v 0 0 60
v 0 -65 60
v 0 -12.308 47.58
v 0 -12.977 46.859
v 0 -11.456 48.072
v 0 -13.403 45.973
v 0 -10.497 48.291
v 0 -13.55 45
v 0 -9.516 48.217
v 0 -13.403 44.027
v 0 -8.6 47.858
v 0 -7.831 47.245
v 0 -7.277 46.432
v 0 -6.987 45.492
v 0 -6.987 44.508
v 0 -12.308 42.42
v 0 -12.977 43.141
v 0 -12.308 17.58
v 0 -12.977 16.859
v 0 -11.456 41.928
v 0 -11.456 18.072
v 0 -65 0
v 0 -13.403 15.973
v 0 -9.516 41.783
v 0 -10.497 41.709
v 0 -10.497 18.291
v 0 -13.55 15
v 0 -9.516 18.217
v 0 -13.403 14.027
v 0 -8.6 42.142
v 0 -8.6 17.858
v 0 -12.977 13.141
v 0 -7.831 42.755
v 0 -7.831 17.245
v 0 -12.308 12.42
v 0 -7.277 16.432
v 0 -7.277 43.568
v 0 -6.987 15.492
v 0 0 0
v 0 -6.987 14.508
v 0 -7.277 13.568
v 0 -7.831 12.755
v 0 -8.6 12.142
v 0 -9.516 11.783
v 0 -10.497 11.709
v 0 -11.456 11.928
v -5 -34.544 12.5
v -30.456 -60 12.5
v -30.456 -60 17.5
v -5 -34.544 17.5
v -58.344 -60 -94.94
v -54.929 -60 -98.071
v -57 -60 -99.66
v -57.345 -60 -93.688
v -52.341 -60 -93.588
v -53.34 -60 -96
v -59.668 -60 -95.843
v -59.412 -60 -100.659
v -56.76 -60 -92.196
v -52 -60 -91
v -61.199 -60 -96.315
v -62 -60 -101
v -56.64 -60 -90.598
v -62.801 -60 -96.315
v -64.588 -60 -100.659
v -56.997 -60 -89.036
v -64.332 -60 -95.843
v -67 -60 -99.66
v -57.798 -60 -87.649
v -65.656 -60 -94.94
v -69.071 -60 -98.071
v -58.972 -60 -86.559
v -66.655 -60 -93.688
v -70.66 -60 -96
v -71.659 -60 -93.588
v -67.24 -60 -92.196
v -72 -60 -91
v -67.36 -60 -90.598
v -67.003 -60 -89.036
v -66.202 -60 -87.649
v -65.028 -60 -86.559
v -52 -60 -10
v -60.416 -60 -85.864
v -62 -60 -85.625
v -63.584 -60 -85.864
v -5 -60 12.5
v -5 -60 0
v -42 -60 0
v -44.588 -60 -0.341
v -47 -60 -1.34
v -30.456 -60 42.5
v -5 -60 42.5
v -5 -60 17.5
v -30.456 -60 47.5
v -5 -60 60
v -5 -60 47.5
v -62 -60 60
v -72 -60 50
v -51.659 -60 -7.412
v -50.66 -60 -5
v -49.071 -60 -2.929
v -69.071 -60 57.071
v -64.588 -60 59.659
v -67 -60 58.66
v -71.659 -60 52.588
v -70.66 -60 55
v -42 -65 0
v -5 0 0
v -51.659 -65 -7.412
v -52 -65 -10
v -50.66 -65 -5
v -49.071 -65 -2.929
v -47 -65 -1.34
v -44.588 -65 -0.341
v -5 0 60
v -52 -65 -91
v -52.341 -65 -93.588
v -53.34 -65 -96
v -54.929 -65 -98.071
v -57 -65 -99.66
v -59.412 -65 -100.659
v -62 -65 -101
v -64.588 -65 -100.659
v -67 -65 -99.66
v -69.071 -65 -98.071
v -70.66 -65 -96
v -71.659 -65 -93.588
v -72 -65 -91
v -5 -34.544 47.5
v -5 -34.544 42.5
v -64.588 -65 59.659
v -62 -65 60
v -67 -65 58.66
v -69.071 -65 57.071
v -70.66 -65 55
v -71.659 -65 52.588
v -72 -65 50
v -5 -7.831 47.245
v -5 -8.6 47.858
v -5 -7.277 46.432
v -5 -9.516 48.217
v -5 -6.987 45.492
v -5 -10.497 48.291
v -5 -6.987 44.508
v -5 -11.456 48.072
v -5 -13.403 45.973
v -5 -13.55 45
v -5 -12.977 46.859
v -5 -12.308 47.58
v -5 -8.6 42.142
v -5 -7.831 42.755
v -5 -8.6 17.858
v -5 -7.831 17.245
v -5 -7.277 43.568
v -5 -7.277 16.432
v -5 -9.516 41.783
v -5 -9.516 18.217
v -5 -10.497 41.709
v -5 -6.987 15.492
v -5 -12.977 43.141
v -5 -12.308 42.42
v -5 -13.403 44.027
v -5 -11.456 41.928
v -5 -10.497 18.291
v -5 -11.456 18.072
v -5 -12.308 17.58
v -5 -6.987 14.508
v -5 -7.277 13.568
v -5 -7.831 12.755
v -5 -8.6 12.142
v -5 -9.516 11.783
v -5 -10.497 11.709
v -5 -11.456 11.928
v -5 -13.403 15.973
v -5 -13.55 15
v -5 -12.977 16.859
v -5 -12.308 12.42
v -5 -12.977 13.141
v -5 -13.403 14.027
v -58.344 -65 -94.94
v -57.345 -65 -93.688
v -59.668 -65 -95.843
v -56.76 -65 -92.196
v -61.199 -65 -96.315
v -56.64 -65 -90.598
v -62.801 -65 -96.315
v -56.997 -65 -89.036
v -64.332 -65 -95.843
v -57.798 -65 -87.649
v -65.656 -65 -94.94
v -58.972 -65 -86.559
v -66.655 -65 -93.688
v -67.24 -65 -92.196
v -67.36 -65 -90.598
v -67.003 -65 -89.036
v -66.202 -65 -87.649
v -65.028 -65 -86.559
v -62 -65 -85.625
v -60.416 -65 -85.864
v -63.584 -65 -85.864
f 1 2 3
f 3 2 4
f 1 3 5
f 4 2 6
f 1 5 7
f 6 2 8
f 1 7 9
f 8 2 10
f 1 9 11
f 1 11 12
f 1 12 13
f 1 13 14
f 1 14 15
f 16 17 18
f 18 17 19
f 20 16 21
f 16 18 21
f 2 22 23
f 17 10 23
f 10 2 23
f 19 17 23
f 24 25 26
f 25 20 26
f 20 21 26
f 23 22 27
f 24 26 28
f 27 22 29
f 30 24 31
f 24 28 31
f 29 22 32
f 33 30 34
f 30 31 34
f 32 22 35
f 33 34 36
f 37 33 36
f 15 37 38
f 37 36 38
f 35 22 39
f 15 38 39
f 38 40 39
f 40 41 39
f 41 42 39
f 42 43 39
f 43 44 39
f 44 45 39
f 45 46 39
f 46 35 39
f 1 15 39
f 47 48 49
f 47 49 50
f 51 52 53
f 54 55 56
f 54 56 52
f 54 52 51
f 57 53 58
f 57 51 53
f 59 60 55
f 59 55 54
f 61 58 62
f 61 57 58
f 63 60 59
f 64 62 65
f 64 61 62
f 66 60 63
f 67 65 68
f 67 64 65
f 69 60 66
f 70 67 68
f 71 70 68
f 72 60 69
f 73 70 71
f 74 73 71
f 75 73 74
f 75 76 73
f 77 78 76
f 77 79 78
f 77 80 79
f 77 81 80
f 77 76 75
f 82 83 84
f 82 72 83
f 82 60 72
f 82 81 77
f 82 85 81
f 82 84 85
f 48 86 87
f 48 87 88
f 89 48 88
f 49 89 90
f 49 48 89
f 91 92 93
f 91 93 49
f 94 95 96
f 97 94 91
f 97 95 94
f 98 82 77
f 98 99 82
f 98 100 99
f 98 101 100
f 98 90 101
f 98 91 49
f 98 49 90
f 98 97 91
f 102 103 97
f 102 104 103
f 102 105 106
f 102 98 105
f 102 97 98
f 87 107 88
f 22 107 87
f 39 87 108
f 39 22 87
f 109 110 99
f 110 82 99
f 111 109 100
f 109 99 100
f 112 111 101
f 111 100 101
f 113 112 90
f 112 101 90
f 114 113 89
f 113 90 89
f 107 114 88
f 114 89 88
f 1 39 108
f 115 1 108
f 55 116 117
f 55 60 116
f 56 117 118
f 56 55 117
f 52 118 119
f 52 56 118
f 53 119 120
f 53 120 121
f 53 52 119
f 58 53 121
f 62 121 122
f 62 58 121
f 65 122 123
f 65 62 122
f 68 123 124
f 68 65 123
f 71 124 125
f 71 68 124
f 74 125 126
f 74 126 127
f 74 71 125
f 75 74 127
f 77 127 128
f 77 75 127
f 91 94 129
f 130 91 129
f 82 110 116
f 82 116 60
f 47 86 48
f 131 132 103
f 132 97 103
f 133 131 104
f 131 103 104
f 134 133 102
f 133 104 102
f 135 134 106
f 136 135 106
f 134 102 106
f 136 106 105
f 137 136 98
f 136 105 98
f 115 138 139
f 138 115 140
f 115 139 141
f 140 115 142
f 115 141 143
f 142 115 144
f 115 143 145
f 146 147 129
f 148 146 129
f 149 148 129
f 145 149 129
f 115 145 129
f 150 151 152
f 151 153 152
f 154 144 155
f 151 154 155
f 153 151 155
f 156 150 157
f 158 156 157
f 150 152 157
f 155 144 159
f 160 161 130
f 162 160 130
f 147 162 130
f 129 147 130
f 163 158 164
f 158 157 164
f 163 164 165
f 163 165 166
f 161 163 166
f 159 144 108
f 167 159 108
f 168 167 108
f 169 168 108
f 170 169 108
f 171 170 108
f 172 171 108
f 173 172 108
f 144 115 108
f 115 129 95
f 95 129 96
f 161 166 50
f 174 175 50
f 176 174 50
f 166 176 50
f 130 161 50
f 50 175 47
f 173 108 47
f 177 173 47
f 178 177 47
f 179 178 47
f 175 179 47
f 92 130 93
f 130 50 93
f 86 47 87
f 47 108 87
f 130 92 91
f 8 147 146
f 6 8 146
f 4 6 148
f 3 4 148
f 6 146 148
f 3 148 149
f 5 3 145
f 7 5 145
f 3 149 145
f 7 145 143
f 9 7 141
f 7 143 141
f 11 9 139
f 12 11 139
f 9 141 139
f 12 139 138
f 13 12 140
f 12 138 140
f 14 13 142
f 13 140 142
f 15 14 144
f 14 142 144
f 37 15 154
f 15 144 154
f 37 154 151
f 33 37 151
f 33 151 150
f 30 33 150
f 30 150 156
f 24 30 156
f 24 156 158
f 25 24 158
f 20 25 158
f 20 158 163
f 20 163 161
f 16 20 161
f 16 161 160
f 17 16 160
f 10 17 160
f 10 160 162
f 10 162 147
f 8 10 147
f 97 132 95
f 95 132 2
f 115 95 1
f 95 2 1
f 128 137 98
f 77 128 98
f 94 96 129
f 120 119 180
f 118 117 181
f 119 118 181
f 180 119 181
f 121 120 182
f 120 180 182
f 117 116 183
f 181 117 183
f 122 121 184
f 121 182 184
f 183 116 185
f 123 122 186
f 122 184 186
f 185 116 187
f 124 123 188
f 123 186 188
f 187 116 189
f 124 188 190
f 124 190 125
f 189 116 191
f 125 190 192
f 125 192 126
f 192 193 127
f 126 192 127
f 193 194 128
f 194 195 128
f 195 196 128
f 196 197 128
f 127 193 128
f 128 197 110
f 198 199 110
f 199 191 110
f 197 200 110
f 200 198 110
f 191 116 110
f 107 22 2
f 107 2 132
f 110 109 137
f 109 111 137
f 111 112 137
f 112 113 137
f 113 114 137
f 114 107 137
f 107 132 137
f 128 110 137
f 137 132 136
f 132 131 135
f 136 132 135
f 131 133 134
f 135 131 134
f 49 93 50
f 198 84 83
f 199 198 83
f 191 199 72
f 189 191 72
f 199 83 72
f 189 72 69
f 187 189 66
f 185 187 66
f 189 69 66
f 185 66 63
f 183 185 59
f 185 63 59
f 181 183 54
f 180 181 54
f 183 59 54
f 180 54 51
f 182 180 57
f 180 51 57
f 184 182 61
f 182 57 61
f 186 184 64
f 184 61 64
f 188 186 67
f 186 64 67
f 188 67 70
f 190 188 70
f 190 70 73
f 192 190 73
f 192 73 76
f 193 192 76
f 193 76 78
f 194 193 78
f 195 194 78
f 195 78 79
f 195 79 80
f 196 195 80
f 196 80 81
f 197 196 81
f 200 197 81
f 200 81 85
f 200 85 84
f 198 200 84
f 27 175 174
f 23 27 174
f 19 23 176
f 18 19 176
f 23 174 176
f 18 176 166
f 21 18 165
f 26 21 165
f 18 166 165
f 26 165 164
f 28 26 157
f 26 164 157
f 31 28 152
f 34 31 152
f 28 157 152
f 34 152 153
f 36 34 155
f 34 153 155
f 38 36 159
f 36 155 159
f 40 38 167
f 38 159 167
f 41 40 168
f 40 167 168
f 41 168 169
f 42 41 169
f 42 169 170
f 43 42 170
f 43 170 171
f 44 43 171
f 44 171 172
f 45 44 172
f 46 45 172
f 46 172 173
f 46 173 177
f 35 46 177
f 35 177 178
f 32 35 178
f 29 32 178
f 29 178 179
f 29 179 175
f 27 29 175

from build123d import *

# Parameters (mm, degrees)
BOSS_EXTRUDE1_DEPTH = 60
SKETCH3_W           = 60
SKETCH3_H           = 5
BOSS_EXTRUDE2_DEPTH = 67
SKETCH4_W           = 20
SKETCH4_H           = 5
BOSS_EXTRUDE3_DEPTH = 101
CUT_EXTRUDE1_REACH  = 139.786
SKETCH6_R           = 5.375
CUT_EXTRUDE2_REACH  = 139.532
SKETCH11_R          = 3.3
FILLET1_R           = 10
FILLET3_R           = 10
FILLET4_R           = 10
BOSS_EXTRUDE4_DEPTH = 2.5


with BuildPart() as part:
    # Sketch1 → Boss-Extrude1 (new body)
    with BuildSketch(Plane.XY):
        Polygon((-5, 0), (-5, -50), (-5, -65), (0, -65), (0, 0), align=None)
    extrude(amount=BOSS_EXTRUDE1_DEPTH)

    # Sketch3 → Boss-Extrude2 (add)
    with BuildSketch(Plane.ZY.offset(5)):
        with Locations((30, -62.5)):
            Rectangle(SKETCH3_W, SKETCH3_H)
    extrude(amount=BOSS_EXTRUDE2_DEPTH)

    # Sketch4 → Boss-Extrude3 (add)
    with BuildSketch(Plane(origin=(0, 0, 0), x_dir=(-1, 0, 0), z_dir=(0, 0, -1))):
        with Locations((62, -62.5)):
            Rectangle(SKETCH4_W, SKETCH4_H)
    extrude(amount=BOSS_EXTRUDE3_DEPTH)

    # Sketch6 → Cut-Extrude1 (cut, up to next)
    with BuildSketch(Plane(origin=(0, -60, 0), x_dir=(1, 0, 0), z_dir=(0, 1, 0)), mode=Mode.PRIVATE) as cut_extrude1_sk1:
        with Locations(Location((-62, 91, 0), (0, 0, 270))):
            Circle(SKETCH6_R)
    cut_extrude1_tool1 = extrude(cut_extrude1_sk1.sketch, amount=-CUT_EXTRUDE1_REACH, mode=Mode.PRIVATE) & part.part
    add(cut_extrude1_tool1.solids().sort_by_distance((-62, -60, -91))[0], mode=Mode.SUBTRACT)

    # Sketch11 → Cut-Extrude2 (cut, up to next)
    with BuildSketch(Plane.ZY.offset(5), mode=Mode.PRIVATE) as cut_extrude2_sk1:
        with Locations(Location((15, -10.25, 0), (0, 0, 270))):
            Circle(SKETCH11_R)
    cut_extrude2_tool1 = extrude(cut_extrude2_sk1.sketch, amount=-CUT_EXTRUDE2_REACH, mode=Mode.PRIVATE) & part.part
    # Sketch11 → Cut-Extrude2 (cut, up to next)
    with BuildSketch(Plane.ZY.offset(5), mode=Mode.PRIVATE) as cut_extrude2_sk2:
        with Locations(Location((45, -10.25, 0), (0, 0, 270))):
            Circle(SKETCH11_R)
    cut_extrude2_tool2 = extrude(cut_extrude2_sk2.sketch, amount=-CUT_EXTRUDE2_REACH, mode=Mode.PRIVATE) & part.part
    add(cut_extrude2_tool1.solids().sort_by_distance((-5, -10.25, 15))[0], mode=Mode.SUBTRACT)
    add(cut_extrude2_tool2.solids().sort_by_distance((-5, -10.25, 45))[0], mode=Mode.SUBTRACT)

    # Fillet1
    fillet1_edges = [part.edges().sort_by_distance(p)[0] for p in [
        (-52, -62.5, -101),
        (-72, -62.5, -101),
    ]]
    fillet(fillet1_edges, radius=FILLET1_R - 0.0001)  # a hair under: the kernel refuses the full size

    # Fillet3
    fillet3_edges = [part.edges().sort_by_distance(p)[0] for p in [
        (-52, -62.5, 0),
    ]]
    fillet(fillet3_edges, radius=FILLET3_R)

    # Fillet4
    fillet4_edges = [part.edges().sort_by_distance(p)[0] for p in [
        (-72, -62.5, 60),
    ]]
    fillet(fillet4_edges, radius=FILLET4_R)

    # Sketch13 → Boss-Extrude4 (add, symmetric)
    with BuildSketch(Plane.XY.offset(45)):
        Polygon((-30.455844123, -60), (-5, -34.544155877), (-5, -60), align=None)
    boss_extrude4 = extrude(amount=BOSS_EXTRUDE4_DEPTH, both=True)

    # Mirror1: Boss-Extrude4 across plane
    add(boss_extrude4.mirror(Plane.XY.offset(30)))


solid = part.part
